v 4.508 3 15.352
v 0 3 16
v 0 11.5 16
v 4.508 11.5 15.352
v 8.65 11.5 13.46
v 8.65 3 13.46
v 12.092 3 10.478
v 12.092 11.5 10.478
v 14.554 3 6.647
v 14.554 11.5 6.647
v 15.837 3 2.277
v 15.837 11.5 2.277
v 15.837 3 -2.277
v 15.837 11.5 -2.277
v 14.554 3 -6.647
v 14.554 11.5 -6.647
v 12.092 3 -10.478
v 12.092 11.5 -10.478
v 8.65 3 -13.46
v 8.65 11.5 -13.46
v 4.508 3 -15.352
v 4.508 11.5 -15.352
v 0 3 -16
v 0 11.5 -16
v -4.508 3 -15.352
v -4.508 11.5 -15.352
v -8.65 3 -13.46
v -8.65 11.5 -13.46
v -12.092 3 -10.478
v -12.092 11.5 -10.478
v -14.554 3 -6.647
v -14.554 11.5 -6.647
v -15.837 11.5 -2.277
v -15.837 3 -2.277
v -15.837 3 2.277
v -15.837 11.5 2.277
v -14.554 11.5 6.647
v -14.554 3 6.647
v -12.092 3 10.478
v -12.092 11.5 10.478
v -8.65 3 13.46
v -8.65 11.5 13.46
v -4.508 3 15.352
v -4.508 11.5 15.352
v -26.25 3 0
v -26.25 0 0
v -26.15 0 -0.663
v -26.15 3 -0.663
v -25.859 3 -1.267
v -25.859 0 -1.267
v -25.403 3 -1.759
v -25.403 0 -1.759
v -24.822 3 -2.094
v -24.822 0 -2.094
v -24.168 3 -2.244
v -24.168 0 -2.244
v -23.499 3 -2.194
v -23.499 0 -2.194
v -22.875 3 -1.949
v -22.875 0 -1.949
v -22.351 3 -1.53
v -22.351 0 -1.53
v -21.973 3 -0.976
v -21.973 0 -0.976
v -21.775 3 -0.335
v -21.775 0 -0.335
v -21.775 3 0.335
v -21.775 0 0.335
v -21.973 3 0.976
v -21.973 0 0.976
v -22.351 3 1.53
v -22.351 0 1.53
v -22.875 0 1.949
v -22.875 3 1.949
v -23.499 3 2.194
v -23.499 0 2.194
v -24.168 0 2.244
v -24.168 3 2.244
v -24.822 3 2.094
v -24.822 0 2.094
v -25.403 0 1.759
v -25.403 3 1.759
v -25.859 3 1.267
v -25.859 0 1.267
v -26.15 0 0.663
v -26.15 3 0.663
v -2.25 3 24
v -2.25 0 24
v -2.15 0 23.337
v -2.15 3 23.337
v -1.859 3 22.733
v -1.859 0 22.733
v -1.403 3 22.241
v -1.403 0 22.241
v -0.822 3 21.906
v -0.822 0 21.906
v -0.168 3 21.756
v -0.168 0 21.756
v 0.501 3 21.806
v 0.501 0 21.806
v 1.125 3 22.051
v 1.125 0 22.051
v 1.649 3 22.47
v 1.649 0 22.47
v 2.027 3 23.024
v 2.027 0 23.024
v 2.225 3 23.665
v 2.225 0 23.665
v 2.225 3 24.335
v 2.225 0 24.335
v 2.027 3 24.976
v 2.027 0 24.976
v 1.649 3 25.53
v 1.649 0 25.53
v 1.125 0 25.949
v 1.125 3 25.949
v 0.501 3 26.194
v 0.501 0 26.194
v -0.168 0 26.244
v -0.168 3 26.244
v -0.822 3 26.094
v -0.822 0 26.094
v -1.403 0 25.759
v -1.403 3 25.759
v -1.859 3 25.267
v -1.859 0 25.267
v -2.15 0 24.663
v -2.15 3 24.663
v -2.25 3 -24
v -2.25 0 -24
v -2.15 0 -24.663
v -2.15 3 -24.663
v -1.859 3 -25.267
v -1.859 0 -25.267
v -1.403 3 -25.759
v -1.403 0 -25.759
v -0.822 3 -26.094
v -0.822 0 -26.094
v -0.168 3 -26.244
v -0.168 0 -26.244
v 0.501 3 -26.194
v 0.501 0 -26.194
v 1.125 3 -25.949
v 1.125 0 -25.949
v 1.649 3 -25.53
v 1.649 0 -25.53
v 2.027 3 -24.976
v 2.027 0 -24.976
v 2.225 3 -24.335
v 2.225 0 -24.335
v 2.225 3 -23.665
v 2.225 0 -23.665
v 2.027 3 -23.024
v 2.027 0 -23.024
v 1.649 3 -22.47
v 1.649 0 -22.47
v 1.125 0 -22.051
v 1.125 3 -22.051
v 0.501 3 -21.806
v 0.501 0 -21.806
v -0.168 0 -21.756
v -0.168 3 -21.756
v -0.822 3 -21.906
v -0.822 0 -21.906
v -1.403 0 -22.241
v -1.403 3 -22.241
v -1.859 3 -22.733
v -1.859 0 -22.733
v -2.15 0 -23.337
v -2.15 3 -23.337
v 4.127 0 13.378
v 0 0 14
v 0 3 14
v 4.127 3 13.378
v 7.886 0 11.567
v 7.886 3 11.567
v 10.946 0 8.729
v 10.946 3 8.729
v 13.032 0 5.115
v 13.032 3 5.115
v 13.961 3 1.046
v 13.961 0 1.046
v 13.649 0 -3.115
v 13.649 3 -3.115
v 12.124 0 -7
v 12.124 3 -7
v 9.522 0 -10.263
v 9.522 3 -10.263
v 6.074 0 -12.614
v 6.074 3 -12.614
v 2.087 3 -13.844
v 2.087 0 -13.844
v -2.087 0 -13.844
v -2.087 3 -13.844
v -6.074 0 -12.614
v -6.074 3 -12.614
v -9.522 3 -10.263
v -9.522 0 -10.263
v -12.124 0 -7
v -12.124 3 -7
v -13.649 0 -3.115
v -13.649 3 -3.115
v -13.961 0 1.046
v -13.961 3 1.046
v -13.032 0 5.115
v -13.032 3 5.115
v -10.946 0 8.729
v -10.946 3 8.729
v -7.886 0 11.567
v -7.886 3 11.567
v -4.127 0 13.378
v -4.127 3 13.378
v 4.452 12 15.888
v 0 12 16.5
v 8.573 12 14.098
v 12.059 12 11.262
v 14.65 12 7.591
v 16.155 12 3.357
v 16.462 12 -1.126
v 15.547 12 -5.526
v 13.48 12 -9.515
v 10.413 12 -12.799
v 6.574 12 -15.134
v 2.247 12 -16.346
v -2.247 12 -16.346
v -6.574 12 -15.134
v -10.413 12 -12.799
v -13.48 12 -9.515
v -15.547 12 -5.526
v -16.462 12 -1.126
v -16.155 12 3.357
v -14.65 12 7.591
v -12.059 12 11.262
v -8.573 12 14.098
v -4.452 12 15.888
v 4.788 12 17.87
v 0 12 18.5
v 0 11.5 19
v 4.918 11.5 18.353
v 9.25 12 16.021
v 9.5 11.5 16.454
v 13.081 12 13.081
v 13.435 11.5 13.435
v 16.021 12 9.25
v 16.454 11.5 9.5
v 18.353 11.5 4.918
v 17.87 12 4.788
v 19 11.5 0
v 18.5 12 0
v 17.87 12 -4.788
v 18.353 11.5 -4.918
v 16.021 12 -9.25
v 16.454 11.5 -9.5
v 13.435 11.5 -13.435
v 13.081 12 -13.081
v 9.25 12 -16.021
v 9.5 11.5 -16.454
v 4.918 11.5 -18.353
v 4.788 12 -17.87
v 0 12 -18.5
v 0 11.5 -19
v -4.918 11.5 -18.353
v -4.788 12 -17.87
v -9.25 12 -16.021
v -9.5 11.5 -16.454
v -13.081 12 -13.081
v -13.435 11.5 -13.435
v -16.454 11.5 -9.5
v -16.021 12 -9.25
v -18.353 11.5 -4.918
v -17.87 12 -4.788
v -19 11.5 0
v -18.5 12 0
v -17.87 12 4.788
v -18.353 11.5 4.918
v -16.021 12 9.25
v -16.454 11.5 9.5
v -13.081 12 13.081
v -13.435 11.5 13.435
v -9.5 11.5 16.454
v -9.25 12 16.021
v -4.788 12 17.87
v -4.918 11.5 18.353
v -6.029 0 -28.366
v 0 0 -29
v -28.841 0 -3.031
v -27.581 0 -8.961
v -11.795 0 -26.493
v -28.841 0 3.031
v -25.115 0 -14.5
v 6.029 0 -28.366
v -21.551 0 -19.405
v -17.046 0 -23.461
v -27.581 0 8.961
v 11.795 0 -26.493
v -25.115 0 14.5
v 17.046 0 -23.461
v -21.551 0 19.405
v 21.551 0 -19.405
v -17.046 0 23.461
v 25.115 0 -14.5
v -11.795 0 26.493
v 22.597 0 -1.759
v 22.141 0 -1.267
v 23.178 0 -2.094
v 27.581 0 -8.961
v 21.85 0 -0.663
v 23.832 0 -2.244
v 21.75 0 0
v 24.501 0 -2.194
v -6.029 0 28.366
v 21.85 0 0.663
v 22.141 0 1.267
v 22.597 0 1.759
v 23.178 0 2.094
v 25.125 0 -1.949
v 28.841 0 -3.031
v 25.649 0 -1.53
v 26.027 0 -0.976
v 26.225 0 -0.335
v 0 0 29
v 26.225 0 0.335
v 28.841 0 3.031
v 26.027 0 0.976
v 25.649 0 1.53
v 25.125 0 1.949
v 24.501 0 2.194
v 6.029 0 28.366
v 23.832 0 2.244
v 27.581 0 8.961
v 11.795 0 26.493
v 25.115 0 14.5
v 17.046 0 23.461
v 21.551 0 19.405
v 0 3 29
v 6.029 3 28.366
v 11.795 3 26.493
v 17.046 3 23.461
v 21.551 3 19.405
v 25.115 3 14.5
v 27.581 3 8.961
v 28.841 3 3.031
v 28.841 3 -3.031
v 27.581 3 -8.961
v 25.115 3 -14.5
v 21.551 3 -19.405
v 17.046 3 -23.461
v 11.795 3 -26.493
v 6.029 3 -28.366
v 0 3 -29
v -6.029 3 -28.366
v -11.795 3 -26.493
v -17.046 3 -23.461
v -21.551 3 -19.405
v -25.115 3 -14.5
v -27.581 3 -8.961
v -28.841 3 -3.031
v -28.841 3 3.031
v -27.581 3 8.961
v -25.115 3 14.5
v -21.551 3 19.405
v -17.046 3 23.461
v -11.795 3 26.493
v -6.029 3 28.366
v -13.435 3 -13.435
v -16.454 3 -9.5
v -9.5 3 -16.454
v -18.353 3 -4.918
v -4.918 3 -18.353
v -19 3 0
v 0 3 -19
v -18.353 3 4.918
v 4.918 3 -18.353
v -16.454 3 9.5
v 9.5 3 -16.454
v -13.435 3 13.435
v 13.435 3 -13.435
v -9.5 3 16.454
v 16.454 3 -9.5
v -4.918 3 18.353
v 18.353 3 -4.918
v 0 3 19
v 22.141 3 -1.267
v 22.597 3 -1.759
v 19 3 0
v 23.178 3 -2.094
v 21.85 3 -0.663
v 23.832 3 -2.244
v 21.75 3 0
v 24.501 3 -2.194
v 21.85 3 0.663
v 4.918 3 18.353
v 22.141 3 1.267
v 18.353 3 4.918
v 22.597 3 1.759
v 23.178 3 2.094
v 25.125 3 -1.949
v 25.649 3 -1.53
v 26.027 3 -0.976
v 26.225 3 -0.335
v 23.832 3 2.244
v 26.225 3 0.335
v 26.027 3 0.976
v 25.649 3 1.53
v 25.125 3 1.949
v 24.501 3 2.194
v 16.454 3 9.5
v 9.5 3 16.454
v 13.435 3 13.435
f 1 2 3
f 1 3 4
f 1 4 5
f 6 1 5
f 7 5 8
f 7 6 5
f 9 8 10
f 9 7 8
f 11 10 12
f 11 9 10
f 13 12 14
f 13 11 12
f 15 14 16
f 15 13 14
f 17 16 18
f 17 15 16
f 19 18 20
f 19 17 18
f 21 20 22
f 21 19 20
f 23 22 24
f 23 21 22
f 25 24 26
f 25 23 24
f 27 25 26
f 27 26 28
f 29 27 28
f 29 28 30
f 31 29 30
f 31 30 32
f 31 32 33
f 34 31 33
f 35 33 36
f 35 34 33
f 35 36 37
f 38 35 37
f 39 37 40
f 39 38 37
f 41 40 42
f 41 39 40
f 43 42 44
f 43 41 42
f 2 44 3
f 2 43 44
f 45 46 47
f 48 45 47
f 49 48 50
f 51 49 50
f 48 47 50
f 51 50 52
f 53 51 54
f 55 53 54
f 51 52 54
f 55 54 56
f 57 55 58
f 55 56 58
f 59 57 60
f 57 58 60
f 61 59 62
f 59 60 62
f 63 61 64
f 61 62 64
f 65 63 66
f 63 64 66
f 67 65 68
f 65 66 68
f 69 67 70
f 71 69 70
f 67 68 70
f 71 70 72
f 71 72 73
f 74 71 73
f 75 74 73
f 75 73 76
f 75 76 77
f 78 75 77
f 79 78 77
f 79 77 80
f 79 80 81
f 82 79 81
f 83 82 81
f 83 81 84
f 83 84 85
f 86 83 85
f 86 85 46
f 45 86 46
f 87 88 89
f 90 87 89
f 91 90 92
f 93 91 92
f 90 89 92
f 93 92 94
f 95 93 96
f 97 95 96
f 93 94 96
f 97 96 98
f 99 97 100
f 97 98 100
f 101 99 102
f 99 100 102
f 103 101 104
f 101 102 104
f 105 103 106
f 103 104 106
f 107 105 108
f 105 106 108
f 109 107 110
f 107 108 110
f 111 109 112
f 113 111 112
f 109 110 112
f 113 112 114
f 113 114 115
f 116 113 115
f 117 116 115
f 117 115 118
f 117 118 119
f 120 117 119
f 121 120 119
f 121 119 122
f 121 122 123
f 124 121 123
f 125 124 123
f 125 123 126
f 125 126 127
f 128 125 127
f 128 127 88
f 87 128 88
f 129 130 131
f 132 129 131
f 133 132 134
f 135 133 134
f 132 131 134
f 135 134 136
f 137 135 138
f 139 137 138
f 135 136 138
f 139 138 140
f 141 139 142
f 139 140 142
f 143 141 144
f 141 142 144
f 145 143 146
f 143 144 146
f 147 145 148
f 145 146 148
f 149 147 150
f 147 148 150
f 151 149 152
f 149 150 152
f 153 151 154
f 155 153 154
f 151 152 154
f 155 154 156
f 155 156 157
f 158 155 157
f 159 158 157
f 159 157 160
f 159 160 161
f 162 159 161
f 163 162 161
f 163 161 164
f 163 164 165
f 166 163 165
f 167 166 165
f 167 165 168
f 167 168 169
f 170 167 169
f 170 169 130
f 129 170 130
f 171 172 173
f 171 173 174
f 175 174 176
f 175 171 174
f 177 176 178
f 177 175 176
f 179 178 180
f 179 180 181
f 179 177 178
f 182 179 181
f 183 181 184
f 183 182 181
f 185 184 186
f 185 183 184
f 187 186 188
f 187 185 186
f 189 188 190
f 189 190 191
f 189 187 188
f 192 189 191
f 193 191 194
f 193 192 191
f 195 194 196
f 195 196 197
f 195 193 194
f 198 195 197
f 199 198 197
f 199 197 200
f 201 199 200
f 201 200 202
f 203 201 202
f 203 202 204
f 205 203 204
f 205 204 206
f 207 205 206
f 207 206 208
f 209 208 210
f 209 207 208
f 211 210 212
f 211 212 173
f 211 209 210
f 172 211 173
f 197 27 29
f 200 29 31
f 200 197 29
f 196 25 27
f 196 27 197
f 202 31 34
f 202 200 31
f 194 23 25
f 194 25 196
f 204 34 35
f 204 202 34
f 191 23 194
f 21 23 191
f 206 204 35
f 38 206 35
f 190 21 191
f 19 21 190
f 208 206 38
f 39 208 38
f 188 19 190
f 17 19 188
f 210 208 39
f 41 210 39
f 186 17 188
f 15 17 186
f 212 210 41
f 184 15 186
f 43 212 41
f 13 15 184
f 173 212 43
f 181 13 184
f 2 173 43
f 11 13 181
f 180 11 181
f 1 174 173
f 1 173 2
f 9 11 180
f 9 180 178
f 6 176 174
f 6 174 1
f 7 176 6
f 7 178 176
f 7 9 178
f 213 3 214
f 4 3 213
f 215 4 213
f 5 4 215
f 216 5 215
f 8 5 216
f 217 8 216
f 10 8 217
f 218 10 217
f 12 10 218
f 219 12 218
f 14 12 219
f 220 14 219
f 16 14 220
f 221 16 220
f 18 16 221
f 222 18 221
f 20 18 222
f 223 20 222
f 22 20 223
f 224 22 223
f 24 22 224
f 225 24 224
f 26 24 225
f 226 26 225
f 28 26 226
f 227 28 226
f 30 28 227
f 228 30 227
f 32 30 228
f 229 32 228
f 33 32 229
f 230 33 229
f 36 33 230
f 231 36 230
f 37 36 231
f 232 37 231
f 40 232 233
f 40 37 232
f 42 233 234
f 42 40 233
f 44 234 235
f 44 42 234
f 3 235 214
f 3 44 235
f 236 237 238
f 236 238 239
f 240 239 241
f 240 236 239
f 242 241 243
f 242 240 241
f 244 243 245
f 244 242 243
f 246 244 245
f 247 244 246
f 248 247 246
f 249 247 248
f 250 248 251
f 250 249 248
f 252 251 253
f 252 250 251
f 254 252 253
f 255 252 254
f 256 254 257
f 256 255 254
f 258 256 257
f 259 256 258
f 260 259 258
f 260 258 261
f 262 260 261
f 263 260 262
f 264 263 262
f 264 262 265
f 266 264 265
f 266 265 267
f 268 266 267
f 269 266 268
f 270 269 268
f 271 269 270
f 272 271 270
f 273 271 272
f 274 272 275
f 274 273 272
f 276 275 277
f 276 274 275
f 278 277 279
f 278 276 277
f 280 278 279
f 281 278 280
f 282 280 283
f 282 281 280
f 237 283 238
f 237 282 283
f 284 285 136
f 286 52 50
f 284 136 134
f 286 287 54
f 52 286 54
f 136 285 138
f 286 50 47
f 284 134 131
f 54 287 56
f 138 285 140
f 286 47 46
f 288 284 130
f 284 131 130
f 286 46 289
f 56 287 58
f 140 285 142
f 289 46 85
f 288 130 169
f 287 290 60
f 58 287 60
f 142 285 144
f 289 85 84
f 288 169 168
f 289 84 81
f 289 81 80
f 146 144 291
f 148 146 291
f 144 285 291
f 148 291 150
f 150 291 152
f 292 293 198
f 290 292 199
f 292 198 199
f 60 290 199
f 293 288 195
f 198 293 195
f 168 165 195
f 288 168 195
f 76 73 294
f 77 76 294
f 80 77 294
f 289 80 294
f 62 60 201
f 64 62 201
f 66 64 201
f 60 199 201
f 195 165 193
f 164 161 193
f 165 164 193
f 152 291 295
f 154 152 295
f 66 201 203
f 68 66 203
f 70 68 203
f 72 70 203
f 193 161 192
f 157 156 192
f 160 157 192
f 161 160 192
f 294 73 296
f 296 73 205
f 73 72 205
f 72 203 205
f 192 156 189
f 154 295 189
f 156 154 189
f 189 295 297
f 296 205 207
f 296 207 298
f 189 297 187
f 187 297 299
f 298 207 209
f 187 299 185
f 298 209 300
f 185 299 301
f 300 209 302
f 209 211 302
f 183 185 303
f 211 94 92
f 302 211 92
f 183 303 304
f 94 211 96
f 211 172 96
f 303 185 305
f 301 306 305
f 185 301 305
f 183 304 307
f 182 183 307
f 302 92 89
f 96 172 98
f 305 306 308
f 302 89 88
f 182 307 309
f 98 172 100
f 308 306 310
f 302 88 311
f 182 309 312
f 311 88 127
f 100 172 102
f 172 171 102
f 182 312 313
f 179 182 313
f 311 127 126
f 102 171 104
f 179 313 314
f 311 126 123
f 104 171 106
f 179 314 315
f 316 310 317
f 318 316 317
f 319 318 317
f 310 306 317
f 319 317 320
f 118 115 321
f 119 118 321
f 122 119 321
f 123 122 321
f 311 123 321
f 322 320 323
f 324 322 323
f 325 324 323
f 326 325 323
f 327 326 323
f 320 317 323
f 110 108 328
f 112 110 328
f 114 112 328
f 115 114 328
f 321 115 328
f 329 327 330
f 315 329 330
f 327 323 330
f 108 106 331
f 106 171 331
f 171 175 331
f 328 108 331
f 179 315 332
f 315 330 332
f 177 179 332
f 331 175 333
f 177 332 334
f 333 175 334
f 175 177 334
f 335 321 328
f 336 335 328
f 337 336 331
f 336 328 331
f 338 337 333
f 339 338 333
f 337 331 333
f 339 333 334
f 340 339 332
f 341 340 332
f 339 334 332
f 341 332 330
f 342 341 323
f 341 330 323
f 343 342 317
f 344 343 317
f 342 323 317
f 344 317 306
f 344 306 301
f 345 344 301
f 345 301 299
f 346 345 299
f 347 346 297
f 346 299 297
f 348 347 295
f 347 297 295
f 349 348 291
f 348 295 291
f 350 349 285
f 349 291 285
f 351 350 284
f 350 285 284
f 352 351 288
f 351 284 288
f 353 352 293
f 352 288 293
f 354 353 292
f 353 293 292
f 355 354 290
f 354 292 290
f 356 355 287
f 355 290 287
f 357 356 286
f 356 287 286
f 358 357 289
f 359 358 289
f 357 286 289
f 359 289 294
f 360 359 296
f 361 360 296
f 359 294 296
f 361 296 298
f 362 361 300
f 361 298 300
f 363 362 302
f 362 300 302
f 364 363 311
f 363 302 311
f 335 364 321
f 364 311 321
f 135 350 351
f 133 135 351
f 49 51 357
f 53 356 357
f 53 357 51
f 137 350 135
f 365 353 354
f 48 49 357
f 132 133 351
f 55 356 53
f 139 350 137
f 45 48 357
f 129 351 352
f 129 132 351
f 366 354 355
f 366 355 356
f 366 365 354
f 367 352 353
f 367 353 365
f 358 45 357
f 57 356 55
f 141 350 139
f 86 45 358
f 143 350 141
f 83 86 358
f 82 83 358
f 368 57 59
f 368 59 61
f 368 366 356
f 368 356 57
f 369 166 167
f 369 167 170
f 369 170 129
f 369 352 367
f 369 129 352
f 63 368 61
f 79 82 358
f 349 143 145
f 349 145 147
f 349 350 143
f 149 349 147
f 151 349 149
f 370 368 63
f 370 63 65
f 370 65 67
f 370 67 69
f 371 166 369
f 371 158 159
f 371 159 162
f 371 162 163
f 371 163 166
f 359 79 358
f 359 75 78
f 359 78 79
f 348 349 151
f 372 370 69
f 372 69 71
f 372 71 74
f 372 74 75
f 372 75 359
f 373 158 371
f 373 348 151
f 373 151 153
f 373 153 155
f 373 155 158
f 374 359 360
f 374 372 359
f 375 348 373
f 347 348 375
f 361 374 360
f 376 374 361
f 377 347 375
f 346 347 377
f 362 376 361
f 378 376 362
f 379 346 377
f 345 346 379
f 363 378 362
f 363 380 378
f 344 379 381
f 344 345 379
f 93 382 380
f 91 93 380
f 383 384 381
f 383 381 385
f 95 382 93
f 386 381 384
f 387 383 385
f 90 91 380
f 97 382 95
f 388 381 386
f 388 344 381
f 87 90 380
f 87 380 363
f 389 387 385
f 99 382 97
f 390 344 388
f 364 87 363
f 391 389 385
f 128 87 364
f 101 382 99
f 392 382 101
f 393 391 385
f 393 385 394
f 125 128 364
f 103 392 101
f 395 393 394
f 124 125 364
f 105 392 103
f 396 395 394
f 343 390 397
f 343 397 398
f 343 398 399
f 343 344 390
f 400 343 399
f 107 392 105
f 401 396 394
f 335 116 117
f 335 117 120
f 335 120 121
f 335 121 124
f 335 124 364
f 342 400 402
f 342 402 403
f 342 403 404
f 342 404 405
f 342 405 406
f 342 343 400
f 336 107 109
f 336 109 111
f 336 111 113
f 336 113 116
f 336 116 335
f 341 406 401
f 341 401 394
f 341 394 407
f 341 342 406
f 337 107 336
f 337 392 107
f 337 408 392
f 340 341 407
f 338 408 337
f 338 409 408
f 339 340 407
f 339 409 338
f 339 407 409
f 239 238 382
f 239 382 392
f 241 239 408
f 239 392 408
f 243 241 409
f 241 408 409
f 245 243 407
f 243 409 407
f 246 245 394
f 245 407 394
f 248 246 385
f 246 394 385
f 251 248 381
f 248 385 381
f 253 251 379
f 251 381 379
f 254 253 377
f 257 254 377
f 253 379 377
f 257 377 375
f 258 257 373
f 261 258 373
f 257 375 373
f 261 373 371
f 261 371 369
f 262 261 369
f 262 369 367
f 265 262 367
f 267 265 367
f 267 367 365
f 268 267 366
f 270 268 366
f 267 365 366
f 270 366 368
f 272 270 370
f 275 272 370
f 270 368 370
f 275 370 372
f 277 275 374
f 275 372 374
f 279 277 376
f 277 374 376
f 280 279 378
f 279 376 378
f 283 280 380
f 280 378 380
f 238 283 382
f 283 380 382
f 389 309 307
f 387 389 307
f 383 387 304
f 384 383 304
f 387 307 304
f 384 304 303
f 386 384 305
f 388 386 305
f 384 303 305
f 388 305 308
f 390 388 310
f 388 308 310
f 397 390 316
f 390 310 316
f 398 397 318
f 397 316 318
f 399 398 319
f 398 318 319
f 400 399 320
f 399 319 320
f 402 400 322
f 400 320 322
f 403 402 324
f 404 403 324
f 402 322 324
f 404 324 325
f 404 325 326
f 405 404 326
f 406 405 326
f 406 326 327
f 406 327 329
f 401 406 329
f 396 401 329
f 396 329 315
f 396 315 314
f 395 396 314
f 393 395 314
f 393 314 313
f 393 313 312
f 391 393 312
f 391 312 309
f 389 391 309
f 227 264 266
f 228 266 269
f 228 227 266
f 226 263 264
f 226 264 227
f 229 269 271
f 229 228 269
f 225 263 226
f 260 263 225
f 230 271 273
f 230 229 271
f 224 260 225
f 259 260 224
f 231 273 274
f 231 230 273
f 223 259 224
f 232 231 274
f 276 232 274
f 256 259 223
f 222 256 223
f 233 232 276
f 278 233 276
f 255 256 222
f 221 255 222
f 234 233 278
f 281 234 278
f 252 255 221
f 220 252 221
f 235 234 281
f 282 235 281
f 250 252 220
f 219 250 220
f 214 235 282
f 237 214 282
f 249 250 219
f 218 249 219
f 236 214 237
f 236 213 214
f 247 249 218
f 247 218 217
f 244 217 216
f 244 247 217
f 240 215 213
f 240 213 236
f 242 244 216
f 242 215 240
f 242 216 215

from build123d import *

# Parameters (mm, degrees)
SKETCH1_R            = 29
SKETCH1_R_2          = 14
SKETCH1_R_3          = 1
BOSS_EXTRUDE1_DEPTH  = 3
SKETCH2_R            = 19
SKETCH2_R_2          = 16
BOSS_EXTRUDE2_DEPTH  = 9
M4_CLEARANCE_HOLE1_D = 4.5
CHAMFER1_SIZE        = 0.5


with BuildPart() as part:
    # Sketch1 → Boss-Extrude1 (new body)
    with BuildSketch(Plane(origin=(0, 0, 0), x_dir=(1, 0, 0), z_dir=(0, 1, 0))):
        with Locations(Location((0, 0, 0), (0, 0, 270))):
            Circle(SKETCH1_R)
        with Locations(Location((0, 0, 0), (0, 0, 270))):
            Circle(SKETCH1_R_2, mode=Mode.SUBTRACT)
        with Locations(Location((0, 24, 0), (0, 0, 270))):
            Circle(SKETCH1_R_3, mode=Mode.SUBTRACT)
        with Locations(Location((24, 0, 0), (0, 0, 270))):
            Circle(SKETCH1_R_3, mode=Mode.SUBTRACT)
        with Locations(Location((0, -24, 0), (0, 0, 270))):
            Circle(SKETCH1_R_3, mode=Mode.SUBTRACT)
        with Locations(Location((-24, 0, 0), (0, 0, 270))):
            Circle(SKETCH1_R_3, mode=Mode.SUBTRACT)
    extrude(amount=BOSS_EXTRUDE1_DEPTH)

    # Sketch2 → Boss-Extrude2 (add)
    with BuildSketch(Plane(origin=(0, 3, 0), x_dir=(1, 0, 0), z_dir=(0, 1, 0))):
        with Locations(Location((0, 0, 0), (0, 0, 270))):
            Circle(SKETCH2_R)
        with Locations(Location((0, 0, 0), (0, 0, 270))):
            Circle(SKETCH2_R_2, mode=Mode.SUBTRACT)
    extrude(amount=BOSS_EXTRUDE2_DEPTH)

    # M4 Clearance Hole1 (through all)
    with Locations(Plane(origin=(0, 3, 0), x_dir=(1, 0, 0), z_dir=(0, 1, 0))):
        with Locations((0, 24), (24, 0), (0, -24), (-24, 0)):
            Hole(M4_CLEARANCE_HOLE1_D / 2)

    # Chamfer1
    chamfer1_edges = [part.edges().sort_by_distance(p)[0] for p in [
        (0, 12, -19),
        (0, 12, -16),
    ]]
    chamfer(chamfer1_edges, length=CHAMFER1_SIZE)


solid = part.part
